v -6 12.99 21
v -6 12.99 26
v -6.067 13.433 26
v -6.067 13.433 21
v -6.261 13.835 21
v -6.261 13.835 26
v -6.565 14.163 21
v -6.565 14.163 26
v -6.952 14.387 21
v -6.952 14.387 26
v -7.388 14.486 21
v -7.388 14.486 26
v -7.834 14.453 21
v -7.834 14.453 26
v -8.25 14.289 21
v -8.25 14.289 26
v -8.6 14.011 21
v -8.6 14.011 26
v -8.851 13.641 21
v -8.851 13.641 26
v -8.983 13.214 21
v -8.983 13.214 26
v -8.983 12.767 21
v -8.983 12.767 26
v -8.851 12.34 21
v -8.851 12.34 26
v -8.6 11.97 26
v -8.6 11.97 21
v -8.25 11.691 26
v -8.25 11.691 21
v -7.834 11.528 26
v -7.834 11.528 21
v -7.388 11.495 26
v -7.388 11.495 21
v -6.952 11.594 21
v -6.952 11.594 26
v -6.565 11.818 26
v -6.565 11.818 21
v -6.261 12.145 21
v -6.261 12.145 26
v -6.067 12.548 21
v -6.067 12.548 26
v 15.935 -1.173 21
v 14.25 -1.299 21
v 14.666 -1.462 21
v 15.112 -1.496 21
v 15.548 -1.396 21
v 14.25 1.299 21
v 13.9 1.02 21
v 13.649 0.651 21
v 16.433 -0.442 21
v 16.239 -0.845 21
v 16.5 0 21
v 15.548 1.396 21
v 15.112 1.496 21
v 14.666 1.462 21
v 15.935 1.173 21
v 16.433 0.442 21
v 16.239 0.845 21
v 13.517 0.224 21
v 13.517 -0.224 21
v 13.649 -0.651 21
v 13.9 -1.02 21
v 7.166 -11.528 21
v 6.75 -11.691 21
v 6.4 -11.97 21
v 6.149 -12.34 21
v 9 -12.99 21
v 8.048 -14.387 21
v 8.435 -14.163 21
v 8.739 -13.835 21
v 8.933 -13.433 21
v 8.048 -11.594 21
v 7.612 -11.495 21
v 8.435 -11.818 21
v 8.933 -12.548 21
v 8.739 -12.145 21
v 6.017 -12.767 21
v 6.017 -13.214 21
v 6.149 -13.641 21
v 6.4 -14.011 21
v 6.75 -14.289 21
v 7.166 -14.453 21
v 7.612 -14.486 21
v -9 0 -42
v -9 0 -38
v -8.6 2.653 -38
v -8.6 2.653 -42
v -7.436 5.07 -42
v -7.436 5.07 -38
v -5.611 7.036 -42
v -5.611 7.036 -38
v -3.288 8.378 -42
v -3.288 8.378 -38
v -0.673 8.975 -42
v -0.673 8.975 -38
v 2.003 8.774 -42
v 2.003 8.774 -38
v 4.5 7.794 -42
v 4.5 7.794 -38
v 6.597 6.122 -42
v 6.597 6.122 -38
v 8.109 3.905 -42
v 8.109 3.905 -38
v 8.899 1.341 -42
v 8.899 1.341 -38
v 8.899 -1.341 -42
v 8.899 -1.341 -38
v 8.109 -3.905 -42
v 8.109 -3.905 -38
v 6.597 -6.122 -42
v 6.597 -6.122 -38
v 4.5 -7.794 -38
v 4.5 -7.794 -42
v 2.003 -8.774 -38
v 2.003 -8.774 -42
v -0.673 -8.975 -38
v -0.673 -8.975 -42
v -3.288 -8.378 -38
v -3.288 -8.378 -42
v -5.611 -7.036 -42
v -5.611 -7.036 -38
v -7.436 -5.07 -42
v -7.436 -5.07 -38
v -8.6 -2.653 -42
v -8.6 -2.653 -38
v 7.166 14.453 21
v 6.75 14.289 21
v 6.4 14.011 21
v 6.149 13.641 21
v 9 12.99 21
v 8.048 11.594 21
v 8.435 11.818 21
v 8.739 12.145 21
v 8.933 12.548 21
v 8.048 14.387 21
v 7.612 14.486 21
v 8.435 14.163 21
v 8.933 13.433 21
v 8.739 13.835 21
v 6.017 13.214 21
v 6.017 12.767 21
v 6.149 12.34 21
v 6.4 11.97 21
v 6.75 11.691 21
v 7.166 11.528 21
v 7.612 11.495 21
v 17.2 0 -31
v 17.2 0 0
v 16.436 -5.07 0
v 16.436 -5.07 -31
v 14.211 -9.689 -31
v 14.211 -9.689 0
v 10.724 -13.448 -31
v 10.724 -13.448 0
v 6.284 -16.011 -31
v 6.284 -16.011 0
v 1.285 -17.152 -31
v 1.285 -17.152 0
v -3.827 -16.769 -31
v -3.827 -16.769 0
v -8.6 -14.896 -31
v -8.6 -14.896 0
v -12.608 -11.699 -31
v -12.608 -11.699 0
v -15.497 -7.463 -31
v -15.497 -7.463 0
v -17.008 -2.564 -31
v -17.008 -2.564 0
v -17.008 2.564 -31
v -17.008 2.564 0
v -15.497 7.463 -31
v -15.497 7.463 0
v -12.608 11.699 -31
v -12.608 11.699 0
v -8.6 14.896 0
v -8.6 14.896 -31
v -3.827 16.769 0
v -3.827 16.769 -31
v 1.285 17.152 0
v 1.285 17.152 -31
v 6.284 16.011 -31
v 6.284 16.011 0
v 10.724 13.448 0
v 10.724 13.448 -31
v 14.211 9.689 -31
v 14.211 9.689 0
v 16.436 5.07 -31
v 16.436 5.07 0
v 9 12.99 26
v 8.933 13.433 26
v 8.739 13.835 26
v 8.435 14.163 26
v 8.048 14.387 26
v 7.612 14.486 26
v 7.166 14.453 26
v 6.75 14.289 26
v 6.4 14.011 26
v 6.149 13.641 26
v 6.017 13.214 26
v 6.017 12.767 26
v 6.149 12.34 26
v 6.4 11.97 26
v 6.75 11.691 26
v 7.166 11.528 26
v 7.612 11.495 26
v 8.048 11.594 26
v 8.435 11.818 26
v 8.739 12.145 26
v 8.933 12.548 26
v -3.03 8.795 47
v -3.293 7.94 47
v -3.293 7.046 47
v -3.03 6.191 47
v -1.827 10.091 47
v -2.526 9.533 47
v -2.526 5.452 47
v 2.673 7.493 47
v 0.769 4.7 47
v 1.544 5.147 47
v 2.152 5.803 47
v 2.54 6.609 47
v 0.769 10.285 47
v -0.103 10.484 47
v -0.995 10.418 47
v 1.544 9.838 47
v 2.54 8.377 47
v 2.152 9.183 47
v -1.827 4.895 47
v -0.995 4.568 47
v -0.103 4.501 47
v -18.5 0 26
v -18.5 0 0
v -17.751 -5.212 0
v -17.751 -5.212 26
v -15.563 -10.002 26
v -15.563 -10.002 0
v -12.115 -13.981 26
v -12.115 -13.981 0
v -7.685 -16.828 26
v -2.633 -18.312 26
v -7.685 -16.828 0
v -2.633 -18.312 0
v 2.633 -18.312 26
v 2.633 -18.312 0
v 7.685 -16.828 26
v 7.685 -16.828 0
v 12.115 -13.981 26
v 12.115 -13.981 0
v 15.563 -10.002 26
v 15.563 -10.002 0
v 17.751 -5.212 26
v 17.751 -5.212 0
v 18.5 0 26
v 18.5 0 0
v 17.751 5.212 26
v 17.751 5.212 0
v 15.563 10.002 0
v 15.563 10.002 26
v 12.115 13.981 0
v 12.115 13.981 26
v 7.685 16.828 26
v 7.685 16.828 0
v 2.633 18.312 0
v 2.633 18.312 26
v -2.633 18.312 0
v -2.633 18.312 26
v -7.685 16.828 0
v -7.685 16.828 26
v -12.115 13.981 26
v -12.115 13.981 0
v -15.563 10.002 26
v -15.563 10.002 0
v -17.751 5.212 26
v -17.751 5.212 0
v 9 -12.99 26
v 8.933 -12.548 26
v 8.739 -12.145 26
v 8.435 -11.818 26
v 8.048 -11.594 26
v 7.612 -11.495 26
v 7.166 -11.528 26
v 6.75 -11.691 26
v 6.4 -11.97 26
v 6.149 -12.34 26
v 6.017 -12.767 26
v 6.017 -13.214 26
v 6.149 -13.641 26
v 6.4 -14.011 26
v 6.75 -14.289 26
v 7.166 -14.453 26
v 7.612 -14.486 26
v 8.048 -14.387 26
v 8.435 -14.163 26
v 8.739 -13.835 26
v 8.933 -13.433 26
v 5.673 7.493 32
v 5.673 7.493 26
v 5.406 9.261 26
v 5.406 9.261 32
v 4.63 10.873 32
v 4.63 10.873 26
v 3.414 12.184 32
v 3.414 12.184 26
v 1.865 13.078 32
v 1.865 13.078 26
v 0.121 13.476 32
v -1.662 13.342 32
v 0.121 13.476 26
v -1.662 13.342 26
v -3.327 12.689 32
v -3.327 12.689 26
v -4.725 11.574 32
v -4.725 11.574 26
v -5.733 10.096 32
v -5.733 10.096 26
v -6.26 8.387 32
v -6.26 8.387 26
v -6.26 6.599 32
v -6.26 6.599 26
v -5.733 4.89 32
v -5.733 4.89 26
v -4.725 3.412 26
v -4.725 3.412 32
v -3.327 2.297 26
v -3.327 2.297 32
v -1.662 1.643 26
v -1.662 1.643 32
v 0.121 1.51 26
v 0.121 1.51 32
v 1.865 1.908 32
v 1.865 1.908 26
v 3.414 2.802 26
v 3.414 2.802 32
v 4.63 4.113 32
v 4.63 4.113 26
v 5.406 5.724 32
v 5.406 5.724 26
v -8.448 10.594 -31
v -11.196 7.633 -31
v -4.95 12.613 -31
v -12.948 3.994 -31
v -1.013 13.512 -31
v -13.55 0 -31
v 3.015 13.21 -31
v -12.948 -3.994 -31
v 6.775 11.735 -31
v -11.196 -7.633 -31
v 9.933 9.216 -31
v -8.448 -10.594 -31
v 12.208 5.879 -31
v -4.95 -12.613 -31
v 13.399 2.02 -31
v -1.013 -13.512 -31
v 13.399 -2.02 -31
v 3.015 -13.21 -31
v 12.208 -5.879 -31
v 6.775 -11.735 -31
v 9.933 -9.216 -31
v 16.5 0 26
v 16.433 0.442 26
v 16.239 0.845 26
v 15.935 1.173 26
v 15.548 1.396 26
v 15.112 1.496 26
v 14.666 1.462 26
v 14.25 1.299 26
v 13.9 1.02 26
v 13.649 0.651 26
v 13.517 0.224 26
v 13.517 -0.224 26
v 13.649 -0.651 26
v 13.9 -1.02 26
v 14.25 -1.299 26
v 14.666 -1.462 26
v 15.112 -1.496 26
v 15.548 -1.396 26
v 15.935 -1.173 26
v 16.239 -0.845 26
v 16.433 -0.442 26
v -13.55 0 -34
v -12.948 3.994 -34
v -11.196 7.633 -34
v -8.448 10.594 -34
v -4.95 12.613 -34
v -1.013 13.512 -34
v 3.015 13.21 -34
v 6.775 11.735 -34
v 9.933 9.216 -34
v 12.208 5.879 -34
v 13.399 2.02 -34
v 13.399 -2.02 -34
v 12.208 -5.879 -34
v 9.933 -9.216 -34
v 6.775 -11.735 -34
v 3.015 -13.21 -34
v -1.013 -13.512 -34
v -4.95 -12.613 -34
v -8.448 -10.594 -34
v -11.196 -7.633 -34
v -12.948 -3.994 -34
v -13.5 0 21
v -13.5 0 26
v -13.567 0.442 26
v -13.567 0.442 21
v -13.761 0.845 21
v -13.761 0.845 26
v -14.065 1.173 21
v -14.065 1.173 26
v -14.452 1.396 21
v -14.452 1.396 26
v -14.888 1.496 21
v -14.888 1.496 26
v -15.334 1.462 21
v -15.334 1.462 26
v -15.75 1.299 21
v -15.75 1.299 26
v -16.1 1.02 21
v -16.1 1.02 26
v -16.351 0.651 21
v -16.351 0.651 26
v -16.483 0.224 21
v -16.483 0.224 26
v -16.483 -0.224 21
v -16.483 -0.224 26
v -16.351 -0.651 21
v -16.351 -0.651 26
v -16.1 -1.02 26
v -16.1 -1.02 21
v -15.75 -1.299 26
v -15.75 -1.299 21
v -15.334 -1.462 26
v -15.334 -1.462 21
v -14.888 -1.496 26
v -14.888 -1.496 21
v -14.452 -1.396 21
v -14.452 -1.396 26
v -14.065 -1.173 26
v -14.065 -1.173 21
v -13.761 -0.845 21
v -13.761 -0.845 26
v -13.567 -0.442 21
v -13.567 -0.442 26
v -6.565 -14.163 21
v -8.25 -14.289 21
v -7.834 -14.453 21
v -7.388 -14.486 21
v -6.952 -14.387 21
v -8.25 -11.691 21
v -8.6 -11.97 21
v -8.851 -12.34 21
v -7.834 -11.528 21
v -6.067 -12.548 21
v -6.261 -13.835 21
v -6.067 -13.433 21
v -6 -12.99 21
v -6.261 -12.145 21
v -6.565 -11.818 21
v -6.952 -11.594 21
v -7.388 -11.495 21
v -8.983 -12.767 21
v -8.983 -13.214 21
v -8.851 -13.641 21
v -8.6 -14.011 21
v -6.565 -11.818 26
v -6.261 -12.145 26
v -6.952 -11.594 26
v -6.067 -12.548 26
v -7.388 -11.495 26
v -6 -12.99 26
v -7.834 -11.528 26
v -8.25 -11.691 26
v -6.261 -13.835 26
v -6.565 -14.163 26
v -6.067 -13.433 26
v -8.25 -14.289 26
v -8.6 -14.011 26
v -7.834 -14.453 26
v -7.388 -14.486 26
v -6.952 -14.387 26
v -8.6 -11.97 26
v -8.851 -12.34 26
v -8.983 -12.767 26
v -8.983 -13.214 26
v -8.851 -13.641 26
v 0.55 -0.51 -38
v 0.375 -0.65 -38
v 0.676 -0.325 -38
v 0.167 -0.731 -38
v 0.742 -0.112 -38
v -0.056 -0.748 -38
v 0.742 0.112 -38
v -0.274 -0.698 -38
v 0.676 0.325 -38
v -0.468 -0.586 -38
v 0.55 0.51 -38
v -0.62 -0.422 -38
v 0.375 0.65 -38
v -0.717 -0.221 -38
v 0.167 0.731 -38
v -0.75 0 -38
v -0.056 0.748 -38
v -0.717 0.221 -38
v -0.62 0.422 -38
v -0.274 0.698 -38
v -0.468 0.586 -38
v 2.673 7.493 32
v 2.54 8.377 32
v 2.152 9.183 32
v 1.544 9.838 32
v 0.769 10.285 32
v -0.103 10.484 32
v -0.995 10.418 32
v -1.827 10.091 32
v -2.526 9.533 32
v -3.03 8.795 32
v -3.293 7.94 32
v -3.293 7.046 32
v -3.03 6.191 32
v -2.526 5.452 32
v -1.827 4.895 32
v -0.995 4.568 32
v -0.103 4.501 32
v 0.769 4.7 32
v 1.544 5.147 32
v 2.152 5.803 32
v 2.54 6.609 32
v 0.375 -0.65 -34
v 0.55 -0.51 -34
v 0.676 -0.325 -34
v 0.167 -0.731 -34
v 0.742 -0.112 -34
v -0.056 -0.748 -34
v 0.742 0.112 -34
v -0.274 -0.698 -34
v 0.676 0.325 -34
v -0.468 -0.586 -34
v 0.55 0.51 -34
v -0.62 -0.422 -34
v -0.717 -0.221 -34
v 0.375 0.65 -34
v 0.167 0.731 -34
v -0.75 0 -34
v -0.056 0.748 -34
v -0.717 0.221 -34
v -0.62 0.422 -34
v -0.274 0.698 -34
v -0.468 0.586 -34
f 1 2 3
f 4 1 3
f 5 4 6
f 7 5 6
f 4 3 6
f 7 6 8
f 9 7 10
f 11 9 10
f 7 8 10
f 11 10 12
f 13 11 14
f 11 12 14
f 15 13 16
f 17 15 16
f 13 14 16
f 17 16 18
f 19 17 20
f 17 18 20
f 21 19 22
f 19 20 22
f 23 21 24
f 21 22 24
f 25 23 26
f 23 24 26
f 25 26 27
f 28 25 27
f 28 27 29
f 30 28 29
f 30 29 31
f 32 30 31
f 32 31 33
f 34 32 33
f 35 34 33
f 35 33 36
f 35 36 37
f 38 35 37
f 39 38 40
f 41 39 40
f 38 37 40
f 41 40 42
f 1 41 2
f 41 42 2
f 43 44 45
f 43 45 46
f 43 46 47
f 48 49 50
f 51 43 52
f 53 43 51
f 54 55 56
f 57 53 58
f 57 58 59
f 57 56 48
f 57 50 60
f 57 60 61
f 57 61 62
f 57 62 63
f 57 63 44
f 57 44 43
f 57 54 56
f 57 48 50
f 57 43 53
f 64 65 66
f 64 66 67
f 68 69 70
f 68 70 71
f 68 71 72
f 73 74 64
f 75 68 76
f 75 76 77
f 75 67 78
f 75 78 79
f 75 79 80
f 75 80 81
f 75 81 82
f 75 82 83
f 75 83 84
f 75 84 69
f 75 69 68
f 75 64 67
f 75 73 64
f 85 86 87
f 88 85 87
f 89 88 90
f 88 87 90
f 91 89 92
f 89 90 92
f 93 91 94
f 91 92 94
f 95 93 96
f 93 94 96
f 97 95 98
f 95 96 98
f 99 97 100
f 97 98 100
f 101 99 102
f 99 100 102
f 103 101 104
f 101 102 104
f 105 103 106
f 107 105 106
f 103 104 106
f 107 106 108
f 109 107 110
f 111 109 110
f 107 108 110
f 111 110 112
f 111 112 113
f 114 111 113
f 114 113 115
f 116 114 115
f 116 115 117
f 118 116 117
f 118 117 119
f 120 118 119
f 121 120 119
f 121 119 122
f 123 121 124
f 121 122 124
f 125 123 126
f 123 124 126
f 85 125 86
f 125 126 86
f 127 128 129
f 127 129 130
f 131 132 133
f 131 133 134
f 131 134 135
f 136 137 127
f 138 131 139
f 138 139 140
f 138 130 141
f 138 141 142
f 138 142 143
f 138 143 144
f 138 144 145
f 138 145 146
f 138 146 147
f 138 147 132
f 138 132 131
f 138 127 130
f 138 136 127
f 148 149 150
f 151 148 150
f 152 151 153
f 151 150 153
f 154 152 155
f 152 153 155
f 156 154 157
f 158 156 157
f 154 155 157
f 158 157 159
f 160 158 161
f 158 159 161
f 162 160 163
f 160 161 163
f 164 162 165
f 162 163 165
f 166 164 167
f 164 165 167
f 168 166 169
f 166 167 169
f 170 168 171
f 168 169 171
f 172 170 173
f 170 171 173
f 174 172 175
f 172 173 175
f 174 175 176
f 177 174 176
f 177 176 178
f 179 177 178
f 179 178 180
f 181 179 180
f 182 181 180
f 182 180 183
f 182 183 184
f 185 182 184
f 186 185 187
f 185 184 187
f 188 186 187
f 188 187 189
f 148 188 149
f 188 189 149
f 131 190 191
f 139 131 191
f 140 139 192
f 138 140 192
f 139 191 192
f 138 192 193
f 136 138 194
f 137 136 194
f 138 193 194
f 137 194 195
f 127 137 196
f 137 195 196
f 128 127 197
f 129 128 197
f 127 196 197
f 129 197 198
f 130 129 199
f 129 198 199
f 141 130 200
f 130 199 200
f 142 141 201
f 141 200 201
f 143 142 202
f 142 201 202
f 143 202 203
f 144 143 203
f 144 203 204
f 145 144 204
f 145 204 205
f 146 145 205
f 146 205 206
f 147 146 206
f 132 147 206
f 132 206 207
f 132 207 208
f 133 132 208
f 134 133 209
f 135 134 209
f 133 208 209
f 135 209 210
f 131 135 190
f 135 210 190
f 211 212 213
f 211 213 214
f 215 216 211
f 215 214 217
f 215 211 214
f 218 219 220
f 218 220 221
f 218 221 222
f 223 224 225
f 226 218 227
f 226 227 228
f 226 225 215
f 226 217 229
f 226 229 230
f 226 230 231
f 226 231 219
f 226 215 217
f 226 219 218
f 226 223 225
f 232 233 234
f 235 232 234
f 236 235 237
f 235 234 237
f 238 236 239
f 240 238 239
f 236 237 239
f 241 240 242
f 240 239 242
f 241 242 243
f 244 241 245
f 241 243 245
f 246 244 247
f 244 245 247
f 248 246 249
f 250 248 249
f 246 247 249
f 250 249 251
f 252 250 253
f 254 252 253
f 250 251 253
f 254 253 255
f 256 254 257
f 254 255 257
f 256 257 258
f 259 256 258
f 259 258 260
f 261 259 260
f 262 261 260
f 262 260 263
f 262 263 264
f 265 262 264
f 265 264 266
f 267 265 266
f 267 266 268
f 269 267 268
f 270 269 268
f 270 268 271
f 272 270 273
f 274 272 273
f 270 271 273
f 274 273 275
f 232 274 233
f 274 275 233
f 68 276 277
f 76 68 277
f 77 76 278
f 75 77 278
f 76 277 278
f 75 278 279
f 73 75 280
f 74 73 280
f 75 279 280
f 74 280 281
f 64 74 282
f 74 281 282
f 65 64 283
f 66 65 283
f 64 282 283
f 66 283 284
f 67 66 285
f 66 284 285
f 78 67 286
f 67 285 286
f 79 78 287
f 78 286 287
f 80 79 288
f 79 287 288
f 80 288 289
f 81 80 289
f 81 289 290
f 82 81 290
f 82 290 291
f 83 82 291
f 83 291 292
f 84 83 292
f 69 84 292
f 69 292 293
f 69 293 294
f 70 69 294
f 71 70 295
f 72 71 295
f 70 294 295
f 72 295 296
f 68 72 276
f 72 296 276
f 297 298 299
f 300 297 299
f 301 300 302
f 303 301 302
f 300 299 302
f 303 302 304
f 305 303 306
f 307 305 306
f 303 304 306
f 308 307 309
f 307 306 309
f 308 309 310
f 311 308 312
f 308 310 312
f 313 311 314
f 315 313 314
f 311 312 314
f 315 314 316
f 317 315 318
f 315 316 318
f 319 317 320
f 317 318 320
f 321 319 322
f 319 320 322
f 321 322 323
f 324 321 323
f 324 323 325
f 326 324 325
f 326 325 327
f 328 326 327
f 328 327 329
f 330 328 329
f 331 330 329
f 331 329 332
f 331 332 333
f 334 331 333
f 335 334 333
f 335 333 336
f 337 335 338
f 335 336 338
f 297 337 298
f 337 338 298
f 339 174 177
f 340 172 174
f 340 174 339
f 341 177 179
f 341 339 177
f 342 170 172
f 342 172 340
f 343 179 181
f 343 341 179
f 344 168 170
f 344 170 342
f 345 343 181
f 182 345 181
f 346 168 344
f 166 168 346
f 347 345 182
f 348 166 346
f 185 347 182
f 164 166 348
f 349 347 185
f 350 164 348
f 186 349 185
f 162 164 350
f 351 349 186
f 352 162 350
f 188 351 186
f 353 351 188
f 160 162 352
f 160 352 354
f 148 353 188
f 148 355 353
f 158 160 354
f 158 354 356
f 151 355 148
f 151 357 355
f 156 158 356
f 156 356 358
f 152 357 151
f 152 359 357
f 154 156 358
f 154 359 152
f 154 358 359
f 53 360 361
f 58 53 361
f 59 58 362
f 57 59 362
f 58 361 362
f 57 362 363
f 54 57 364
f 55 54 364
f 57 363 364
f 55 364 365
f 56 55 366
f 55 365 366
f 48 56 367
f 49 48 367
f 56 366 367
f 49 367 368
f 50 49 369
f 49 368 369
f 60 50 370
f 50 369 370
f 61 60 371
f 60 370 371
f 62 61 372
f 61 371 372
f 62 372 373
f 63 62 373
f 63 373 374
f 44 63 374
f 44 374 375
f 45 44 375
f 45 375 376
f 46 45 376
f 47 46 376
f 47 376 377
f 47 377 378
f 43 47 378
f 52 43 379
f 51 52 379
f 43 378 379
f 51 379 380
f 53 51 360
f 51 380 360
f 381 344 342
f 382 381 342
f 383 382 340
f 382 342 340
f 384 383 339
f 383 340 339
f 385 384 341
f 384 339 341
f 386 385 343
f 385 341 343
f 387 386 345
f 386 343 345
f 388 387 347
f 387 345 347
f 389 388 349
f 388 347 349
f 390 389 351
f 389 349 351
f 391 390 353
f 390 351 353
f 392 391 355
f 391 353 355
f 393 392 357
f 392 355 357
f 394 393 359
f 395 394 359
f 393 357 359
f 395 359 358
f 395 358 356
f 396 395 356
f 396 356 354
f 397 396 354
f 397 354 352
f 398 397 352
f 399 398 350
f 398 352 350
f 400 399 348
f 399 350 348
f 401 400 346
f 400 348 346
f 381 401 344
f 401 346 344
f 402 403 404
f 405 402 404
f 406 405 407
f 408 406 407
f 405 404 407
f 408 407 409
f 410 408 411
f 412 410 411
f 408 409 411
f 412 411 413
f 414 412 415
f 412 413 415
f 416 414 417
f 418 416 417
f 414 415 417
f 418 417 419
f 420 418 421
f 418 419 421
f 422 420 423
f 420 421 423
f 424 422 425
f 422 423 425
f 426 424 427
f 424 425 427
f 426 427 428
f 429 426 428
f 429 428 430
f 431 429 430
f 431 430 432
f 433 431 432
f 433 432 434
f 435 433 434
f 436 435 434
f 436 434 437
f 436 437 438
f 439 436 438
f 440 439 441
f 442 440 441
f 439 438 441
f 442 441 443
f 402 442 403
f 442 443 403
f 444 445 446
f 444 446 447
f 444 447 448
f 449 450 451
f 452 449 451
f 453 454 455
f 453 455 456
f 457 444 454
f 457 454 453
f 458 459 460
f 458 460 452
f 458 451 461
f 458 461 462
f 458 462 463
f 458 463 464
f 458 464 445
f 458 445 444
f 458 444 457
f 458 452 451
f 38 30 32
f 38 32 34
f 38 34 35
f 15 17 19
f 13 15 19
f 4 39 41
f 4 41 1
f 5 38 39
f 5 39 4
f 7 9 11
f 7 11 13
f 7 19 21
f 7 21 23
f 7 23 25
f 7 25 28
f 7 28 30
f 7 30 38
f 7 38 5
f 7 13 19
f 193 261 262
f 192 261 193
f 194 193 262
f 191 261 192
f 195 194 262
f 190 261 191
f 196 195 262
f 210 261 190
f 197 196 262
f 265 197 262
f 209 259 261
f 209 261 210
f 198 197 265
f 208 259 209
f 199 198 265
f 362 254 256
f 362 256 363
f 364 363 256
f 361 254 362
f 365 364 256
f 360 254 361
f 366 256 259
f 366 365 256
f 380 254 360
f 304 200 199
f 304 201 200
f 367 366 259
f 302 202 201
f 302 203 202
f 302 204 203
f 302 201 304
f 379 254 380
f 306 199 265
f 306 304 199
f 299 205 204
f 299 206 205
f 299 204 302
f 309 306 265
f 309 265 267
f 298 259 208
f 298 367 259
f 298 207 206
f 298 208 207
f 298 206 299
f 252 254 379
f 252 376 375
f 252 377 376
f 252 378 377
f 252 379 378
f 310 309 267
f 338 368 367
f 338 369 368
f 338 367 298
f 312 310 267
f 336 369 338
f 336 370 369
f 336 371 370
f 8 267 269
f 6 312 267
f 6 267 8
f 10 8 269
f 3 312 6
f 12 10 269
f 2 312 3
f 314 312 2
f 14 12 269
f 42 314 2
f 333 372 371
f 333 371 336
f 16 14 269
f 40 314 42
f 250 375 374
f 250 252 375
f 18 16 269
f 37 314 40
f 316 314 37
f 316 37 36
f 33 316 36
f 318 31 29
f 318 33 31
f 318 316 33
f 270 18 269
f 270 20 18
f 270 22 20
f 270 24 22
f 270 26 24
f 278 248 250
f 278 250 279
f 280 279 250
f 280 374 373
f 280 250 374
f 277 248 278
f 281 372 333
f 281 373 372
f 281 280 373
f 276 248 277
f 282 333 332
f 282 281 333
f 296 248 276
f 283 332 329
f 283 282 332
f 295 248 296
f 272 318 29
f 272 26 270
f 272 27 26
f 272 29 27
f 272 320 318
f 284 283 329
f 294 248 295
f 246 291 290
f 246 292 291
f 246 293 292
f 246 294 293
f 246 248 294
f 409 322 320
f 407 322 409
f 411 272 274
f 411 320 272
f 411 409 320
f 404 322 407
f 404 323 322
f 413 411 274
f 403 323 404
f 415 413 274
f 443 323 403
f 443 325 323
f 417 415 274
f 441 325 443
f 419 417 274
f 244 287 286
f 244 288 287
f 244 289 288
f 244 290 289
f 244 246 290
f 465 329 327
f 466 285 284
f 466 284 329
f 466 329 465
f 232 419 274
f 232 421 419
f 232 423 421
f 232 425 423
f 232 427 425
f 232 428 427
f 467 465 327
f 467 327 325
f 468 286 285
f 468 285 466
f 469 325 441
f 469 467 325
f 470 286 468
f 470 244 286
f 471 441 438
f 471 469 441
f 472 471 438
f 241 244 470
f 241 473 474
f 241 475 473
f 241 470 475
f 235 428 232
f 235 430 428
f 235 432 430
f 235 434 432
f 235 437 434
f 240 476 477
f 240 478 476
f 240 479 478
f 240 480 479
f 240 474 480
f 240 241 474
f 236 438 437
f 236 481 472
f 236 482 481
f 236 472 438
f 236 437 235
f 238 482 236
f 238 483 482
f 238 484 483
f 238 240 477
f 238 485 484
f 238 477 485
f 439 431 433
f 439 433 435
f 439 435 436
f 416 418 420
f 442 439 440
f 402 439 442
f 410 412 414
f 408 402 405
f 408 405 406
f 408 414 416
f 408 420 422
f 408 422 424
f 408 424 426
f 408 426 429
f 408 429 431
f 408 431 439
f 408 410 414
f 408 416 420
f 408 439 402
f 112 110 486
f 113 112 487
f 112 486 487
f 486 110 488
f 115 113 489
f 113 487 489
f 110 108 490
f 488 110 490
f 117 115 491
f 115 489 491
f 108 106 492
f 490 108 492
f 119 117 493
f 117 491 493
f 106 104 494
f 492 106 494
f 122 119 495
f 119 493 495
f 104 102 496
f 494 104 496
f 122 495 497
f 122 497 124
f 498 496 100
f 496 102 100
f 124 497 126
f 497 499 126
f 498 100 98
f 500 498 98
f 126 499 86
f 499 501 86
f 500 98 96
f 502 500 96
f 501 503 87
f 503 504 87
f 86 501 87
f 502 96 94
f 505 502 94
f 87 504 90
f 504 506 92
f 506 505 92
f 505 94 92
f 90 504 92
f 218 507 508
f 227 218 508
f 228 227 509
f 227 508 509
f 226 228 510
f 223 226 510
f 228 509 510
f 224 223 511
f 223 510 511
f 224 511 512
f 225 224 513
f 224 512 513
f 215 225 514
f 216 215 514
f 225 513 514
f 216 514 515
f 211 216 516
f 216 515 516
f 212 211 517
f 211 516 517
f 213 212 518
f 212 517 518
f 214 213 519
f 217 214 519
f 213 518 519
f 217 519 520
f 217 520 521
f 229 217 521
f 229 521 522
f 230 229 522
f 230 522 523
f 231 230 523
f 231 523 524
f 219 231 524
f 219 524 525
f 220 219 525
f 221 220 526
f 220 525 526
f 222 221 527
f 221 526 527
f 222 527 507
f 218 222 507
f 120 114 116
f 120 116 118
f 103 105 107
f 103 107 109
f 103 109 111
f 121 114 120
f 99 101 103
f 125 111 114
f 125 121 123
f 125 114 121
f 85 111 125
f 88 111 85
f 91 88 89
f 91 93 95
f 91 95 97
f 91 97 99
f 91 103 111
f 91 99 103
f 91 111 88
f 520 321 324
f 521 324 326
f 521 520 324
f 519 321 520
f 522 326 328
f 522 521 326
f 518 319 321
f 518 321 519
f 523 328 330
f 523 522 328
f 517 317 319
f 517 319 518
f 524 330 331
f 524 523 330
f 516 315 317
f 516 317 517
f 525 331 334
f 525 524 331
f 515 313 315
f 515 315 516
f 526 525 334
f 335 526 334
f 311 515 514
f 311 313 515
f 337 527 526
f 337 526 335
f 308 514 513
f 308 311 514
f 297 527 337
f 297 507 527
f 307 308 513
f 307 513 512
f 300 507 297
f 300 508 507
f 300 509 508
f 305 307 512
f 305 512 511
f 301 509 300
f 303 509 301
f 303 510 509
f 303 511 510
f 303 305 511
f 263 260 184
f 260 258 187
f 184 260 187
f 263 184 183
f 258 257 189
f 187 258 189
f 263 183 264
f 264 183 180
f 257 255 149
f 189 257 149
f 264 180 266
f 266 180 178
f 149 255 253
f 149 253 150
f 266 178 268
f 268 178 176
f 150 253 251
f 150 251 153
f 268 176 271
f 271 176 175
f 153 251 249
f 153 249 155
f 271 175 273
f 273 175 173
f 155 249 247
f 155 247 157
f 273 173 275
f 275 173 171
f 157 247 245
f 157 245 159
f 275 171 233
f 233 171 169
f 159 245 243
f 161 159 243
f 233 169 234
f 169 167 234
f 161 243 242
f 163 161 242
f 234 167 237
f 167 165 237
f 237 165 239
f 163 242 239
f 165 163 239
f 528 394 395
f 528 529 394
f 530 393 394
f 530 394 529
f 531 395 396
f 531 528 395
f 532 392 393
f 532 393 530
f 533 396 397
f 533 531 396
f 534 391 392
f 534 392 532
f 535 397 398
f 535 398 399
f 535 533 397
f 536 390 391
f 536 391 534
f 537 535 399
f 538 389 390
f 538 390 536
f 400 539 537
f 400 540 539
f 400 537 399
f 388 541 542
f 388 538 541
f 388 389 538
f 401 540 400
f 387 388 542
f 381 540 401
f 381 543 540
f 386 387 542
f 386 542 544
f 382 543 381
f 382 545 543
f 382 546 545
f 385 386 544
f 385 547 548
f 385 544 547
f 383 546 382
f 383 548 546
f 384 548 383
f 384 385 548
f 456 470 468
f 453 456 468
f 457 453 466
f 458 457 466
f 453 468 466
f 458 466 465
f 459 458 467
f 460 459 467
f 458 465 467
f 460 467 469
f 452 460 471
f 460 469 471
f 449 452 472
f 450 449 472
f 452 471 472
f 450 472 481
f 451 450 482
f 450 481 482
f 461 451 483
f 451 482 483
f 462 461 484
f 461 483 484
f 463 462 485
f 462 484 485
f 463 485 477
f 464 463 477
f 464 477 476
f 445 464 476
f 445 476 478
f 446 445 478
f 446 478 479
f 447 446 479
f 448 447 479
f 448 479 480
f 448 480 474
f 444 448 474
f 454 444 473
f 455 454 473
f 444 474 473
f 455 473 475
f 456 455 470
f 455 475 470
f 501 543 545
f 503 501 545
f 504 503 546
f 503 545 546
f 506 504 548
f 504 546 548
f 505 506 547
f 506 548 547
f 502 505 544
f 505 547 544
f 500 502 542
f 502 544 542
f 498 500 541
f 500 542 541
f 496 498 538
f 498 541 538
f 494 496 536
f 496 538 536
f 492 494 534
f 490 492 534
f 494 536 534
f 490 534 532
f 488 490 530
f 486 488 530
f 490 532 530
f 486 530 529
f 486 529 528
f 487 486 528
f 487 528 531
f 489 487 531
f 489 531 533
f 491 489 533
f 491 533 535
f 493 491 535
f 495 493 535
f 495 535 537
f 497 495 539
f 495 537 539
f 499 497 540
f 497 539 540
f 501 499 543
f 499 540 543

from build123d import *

# Parameters (mm, degrees)
ESQUISSE1_R             = 18.5
BOSS_EXTRU_1_DEPTH      = 26
ESQUISSE2_R             = 17.2
BOSS_EXTRU_2_DEPTH      = 31
ESQUISSE3_R             = 13.55
BOSS_EXTRU_3_DEPTH      = 3
ESQUISSE4_R             = 0.75
BOSS_EXTRU_4_DEPTH      = 4
ESQUISSE5_R             = 9
BOSS_EXTRU_5_DEPTH      = 4
ESQUISSE6_R             = 6
BOSS_EXTRU_7_DEPTH      = 6
ESQUISSE8_R             = 3
BOSS_EXTRU_8_DEPTH      = 15
ESQUISSE9_R             = 1.5
ENL_V_MAT_EXTRU_4_DEPTH = 5


with BuildPart() as part:
    # Esquisse1 → Boss.-Extru.1 (new body)
    with BuildSketch(Plane.XY):
        with Locations(Location((0, 0, 0), (0, 0, 180))):
            Circle(ESQUISSE1_R)
    extrude(amount=BOSS_EXTRU_1_DEPTH)

    # Esquisse2 → Boss.-Extru.2 (add)
    with BuildSketch(Plane(origin=(0, 0, 0), x_dir=(-1, 0, 0), z_dir=(0, 0, -1))):
        with Locations(Location((0, 0, 0), (0, 0, 180))):
            Circle(ESQUISSE2_R)
    extrude(amount=BOSS_EXTRU_2_DEPTH)

    # Esquisse3 → Boss.-Extru.3 (add)
    with BuildSketch(Plane(origin=(0, 0, -31), x_dir=(-1, 0, 0), z_dir=(0, 0, -1))):
        Circle(ESQUISSE3_R)
    extrude(amount=BOSS_EXTRU_3_DEPTH)

    # Esquisse4 → Boss.-Extru.4 (add)
    with BuildSketch(Plane(origin=(0, 0, -34), x_dir=(-1, 0, 0), z_dir=(0, 0, -1))):
        Circle(ESQUISSE4_R)
    extrude(amount=BOSS_EXTRU_4_DEPTH)

    # Esquisse5 → Boss.-Extru.5 (add)
    with BuildSketch(Plane(origin=(0, 0, -38), x_dir=(-1, 0, 0), z_dir=(0, 0, -1))):
        Circle(ESQUISSE5_R)
    extrude(amount=BOSS_EXTRU_5_DEPTH)

    # Esquisse6 → Boss.-Extru.7 (add)
    with BuildSketch(Plane.XY.offset(26)):
        with Locations((-0.326961586, 7.492869685)):
            Circle(ESQUISSE6_R)
    extrude(amount=BOSS_EXTRU_7_DEPTH)

    # Esquisse8 → Boss.-Extru.8 (add)
    with BuildSketch(Plane.XY.offset(32)):
        with Locations((-0.326961586, 7.492869685)):
            Circle(ESQUISSE8_R)
    extrude(amount=BOSS_EXTRU_8_DEPTH)

    # Esquisse9 → Enlèv. mat.-Extru.4 (cut)
    with BuildSketch(Plane.XY.offset(26)):
        with Locations((15, 0)):
            Circle(ESQUISSE9_R)
        with Locations((7.5, -12.990381057)):
            Circle(ESQUISSE9_R)
        with Locations((-7.5, -12.990381057)):
            Circle(ESQUISSE9_R)
        with Locations((-15, 0)):
            Circle(ESQUISSE9_R)
        with Locations((-7.5, 12.990381057)):
            Circle(ESQUISSE9_R)
        with Locations((7.5, 12.990381057)):
            Circle(ESQUISSE9_R)
    extrude(amount=-ENL_V_MAT_EXTRU_4_DEPTH, mode=Mode.SUBTRACT)


solid = part.part
